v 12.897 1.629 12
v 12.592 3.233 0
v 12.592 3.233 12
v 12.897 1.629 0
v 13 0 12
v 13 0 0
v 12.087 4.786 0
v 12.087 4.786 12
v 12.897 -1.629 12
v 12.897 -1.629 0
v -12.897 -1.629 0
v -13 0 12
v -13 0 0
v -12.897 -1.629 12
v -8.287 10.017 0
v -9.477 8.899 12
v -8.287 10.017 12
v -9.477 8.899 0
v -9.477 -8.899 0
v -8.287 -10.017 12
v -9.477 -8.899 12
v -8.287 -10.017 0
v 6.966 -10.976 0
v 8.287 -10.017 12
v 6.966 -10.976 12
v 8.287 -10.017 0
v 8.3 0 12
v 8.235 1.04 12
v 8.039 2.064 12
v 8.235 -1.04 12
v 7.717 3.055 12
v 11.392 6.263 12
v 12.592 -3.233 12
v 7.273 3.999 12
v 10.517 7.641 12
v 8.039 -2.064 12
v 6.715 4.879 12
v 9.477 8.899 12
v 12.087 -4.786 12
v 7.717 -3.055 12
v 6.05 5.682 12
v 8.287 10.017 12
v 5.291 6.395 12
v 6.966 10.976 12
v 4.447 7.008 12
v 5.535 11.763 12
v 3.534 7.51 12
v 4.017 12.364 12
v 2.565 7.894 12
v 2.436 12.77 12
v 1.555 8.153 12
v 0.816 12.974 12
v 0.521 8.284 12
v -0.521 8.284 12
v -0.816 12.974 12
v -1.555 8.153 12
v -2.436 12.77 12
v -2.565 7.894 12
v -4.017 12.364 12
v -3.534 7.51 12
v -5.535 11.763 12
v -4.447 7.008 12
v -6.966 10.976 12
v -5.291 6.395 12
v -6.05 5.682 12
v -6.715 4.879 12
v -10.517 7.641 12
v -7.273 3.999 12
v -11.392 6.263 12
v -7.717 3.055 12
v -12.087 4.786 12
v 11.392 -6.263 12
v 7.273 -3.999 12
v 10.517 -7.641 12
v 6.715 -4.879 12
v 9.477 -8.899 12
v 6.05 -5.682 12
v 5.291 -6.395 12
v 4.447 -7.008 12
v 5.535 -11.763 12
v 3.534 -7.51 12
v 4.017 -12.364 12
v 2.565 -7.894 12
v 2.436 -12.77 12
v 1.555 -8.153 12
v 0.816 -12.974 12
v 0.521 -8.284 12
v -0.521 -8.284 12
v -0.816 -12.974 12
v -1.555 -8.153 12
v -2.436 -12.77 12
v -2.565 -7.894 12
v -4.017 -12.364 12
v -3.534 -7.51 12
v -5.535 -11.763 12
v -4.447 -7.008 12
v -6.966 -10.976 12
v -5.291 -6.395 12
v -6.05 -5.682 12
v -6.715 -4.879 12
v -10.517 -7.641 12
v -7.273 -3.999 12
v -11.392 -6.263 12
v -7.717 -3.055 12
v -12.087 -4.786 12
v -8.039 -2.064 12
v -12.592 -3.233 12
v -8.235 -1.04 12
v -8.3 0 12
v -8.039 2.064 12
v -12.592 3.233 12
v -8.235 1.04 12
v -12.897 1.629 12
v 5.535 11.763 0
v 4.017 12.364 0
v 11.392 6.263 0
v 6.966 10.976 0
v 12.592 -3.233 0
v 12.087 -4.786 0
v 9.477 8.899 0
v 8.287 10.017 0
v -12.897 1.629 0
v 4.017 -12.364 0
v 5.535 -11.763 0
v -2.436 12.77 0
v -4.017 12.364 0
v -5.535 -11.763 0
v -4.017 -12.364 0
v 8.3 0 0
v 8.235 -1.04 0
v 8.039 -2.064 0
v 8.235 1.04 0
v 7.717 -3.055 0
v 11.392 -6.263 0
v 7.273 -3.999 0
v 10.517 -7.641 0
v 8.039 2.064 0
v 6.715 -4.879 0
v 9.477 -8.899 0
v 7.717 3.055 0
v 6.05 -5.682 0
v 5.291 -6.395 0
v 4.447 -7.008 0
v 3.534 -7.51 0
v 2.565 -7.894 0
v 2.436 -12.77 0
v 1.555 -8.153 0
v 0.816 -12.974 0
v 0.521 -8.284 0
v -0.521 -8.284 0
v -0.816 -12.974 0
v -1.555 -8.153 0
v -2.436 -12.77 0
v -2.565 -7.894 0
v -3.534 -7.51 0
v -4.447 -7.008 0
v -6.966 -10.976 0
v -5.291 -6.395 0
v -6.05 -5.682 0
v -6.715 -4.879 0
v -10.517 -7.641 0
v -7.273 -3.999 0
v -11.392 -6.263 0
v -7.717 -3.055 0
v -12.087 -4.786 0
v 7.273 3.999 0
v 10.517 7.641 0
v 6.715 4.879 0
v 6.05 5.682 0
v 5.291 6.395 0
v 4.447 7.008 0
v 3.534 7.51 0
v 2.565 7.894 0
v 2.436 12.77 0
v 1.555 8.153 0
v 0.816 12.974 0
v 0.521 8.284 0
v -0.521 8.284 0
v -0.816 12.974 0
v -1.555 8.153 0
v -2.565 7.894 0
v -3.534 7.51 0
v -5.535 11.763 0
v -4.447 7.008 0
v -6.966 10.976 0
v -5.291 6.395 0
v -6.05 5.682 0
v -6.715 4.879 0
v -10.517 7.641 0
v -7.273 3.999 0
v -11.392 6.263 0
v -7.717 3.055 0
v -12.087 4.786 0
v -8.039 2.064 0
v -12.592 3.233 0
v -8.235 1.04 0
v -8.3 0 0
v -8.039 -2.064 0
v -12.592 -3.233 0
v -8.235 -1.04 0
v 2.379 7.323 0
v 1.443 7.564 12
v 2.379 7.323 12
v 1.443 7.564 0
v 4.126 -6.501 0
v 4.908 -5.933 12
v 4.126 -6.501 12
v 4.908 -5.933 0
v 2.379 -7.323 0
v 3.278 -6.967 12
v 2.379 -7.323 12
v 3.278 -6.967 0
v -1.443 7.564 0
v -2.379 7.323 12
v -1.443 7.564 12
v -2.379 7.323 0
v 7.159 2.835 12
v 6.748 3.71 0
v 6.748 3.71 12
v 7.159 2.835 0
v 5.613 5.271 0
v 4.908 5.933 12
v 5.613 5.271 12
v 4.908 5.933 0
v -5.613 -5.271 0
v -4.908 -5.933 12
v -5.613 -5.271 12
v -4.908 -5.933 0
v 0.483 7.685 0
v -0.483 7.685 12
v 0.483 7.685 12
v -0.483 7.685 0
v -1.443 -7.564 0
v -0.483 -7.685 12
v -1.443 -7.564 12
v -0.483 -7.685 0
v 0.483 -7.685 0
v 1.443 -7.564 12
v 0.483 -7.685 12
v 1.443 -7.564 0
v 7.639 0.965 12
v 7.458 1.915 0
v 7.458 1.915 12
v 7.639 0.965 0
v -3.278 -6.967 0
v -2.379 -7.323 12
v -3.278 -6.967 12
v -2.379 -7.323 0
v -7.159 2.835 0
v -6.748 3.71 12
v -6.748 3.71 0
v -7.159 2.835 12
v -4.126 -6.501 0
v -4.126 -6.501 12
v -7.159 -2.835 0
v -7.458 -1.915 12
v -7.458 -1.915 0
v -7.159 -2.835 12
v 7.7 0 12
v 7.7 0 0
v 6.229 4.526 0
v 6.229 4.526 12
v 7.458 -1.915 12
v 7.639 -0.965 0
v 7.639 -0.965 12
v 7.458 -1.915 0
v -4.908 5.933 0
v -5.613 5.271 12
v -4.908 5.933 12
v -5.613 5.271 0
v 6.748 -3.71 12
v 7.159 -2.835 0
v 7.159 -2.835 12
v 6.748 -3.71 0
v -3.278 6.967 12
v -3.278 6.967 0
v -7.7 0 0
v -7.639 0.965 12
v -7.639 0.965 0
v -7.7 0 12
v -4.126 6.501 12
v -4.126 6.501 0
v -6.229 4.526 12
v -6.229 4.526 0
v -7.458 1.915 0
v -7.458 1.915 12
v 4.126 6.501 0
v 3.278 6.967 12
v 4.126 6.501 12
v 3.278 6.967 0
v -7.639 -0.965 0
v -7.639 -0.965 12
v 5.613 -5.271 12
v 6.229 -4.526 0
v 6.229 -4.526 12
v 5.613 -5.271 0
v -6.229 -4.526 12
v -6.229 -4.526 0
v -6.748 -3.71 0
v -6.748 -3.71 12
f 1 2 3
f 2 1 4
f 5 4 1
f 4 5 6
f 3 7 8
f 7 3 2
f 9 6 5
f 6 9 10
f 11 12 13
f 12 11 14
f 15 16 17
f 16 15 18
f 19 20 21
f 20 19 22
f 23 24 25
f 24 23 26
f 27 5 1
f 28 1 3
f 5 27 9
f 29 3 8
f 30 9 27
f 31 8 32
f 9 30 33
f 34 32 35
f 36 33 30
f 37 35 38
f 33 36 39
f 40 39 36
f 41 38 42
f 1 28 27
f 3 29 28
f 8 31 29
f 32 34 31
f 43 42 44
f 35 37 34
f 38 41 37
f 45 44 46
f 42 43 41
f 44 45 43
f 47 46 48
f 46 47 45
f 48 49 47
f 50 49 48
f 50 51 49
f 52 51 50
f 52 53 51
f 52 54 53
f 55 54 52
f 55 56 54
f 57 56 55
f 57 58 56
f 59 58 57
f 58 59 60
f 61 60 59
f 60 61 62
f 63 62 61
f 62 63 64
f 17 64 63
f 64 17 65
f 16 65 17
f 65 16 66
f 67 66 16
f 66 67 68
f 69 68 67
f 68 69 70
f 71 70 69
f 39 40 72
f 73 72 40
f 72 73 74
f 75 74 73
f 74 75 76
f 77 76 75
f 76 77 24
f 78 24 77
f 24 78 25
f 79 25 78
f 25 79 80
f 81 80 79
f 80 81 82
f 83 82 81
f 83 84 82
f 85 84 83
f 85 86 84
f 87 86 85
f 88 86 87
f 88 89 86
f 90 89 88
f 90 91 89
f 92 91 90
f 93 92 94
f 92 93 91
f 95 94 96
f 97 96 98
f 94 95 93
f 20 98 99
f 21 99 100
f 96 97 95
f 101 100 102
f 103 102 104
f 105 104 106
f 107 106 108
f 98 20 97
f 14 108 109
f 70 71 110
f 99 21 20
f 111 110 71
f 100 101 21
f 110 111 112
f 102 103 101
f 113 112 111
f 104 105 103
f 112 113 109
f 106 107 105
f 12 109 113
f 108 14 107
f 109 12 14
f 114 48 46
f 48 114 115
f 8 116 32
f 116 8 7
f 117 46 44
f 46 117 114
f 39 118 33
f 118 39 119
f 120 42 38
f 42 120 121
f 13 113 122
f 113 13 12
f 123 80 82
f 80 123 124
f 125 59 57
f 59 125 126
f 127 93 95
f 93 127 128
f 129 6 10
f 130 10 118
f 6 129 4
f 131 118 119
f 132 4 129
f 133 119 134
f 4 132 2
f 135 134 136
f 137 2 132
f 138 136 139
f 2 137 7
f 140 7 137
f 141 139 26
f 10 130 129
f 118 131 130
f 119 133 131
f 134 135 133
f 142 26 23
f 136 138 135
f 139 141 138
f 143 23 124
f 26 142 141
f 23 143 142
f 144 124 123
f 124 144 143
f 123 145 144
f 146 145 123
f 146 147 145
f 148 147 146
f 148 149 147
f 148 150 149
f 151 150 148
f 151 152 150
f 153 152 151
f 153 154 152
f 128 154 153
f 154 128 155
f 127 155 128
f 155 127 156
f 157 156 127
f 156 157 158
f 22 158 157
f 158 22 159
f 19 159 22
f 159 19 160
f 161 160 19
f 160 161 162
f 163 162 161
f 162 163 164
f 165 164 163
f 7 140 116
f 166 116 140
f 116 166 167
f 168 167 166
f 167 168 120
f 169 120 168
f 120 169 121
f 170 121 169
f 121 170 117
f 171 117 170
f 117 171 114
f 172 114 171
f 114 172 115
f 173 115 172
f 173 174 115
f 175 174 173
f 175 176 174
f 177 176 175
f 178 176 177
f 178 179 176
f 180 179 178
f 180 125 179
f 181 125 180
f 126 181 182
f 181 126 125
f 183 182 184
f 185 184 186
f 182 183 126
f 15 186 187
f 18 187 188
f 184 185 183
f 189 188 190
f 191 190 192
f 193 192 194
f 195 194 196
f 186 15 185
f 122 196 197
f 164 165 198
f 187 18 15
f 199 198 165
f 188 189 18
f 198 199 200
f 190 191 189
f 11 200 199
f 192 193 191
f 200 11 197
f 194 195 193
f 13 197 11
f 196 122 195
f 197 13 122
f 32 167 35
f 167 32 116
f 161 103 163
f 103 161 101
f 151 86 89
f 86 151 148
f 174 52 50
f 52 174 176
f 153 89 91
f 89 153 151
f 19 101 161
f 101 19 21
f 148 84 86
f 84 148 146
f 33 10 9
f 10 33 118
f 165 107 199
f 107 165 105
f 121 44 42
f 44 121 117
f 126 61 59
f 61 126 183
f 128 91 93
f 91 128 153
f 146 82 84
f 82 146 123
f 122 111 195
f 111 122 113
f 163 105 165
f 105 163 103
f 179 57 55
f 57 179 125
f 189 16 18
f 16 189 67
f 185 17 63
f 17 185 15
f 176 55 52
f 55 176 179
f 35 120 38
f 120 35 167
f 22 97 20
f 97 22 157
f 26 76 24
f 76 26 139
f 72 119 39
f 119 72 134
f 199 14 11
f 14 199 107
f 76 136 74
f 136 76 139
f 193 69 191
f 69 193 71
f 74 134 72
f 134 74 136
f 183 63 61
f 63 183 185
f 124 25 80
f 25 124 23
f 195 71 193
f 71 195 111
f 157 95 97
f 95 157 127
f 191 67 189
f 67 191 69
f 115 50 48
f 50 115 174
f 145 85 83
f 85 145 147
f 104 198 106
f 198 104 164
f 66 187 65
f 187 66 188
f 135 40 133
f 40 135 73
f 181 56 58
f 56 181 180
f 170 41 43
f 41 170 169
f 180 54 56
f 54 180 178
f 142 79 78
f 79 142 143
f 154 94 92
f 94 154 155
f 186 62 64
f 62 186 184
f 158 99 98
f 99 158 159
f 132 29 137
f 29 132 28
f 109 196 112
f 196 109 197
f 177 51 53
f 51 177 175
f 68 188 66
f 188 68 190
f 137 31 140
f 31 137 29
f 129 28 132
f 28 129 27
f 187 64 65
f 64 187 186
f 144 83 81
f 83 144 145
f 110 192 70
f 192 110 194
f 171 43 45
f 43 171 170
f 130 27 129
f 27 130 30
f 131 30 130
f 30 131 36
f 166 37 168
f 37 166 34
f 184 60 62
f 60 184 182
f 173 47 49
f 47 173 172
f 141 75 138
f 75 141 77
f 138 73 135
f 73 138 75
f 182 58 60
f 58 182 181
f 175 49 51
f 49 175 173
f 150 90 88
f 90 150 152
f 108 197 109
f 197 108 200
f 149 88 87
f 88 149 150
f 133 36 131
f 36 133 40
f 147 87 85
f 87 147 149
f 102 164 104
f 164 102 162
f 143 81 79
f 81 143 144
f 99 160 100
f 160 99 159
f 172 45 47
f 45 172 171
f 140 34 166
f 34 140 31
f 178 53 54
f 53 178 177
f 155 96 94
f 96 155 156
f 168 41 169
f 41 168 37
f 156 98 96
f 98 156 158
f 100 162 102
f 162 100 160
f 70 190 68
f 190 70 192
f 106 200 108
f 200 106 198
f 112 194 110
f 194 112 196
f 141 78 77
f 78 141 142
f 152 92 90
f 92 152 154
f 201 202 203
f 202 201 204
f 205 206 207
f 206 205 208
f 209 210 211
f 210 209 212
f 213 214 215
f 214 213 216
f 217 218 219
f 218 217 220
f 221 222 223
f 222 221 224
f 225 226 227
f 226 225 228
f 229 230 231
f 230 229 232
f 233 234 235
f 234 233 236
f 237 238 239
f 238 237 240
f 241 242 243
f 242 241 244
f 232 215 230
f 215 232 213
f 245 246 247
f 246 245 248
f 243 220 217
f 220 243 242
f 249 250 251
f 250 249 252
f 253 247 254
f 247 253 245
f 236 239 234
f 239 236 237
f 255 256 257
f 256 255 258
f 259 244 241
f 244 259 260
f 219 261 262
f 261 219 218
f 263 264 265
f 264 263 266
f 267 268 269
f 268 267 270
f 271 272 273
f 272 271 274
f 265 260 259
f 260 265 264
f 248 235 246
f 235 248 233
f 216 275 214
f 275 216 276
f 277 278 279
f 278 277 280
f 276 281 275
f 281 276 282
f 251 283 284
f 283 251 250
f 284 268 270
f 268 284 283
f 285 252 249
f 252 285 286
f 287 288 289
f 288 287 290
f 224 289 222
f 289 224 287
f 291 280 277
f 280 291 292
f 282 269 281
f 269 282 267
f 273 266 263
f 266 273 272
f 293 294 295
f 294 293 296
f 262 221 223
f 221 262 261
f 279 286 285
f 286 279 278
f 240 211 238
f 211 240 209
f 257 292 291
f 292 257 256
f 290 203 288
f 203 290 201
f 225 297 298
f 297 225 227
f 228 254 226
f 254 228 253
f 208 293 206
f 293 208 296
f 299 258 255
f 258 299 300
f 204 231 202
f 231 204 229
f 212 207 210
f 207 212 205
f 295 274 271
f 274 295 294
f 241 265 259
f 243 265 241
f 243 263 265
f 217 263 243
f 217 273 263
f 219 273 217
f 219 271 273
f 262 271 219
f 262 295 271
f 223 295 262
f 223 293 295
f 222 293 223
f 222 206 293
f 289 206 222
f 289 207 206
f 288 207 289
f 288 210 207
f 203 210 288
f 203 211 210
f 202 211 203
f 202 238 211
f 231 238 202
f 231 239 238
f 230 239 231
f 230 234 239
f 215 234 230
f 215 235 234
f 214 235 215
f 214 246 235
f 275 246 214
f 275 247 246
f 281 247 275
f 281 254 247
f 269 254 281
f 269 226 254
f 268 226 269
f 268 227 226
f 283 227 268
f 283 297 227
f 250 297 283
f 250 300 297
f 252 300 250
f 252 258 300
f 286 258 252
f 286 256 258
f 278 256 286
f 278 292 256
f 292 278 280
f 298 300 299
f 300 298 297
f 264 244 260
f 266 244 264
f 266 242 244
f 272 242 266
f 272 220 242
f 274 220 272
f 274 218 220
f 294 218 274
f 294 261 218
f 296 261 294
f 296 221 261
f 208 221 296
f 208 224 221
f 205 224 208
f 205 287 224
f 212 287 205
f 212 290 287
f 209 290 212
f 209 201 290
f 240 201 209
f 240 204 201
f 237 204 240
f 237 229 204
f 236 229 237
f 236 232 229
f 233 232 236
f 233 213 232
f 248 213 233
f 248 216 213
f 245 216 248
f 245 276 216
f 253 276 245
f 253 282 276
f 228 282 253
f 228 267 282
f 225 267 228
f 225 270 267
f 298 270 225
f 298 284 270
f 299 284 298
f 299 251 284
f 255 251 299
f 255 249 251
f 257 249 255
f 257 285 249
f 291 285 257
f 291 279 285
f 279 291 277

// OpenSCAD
// Die for pressing small bearings in and out of fixtures.
$fn = 50;

// Outer diameter of the bearing.
bearing_outer_diameter = 16.0;

// Height of the bearing press (a bit bigger than the bearing width).
press_height = 12.0;

// Clearenence so that the printer parts separate.
clearance = 0.6;

difference()
{
    cylinder(r=(bearing_outer_diameter/2)+5, h=press_height);

    translate([0, 0, -0.1])
        cylinder(r=(bearing_outer_diameter+clearance)/2, h=press_height+0.2);
}

cylinder(r=(bearing_outer_diameter-clearance)/2, h=press_height);
